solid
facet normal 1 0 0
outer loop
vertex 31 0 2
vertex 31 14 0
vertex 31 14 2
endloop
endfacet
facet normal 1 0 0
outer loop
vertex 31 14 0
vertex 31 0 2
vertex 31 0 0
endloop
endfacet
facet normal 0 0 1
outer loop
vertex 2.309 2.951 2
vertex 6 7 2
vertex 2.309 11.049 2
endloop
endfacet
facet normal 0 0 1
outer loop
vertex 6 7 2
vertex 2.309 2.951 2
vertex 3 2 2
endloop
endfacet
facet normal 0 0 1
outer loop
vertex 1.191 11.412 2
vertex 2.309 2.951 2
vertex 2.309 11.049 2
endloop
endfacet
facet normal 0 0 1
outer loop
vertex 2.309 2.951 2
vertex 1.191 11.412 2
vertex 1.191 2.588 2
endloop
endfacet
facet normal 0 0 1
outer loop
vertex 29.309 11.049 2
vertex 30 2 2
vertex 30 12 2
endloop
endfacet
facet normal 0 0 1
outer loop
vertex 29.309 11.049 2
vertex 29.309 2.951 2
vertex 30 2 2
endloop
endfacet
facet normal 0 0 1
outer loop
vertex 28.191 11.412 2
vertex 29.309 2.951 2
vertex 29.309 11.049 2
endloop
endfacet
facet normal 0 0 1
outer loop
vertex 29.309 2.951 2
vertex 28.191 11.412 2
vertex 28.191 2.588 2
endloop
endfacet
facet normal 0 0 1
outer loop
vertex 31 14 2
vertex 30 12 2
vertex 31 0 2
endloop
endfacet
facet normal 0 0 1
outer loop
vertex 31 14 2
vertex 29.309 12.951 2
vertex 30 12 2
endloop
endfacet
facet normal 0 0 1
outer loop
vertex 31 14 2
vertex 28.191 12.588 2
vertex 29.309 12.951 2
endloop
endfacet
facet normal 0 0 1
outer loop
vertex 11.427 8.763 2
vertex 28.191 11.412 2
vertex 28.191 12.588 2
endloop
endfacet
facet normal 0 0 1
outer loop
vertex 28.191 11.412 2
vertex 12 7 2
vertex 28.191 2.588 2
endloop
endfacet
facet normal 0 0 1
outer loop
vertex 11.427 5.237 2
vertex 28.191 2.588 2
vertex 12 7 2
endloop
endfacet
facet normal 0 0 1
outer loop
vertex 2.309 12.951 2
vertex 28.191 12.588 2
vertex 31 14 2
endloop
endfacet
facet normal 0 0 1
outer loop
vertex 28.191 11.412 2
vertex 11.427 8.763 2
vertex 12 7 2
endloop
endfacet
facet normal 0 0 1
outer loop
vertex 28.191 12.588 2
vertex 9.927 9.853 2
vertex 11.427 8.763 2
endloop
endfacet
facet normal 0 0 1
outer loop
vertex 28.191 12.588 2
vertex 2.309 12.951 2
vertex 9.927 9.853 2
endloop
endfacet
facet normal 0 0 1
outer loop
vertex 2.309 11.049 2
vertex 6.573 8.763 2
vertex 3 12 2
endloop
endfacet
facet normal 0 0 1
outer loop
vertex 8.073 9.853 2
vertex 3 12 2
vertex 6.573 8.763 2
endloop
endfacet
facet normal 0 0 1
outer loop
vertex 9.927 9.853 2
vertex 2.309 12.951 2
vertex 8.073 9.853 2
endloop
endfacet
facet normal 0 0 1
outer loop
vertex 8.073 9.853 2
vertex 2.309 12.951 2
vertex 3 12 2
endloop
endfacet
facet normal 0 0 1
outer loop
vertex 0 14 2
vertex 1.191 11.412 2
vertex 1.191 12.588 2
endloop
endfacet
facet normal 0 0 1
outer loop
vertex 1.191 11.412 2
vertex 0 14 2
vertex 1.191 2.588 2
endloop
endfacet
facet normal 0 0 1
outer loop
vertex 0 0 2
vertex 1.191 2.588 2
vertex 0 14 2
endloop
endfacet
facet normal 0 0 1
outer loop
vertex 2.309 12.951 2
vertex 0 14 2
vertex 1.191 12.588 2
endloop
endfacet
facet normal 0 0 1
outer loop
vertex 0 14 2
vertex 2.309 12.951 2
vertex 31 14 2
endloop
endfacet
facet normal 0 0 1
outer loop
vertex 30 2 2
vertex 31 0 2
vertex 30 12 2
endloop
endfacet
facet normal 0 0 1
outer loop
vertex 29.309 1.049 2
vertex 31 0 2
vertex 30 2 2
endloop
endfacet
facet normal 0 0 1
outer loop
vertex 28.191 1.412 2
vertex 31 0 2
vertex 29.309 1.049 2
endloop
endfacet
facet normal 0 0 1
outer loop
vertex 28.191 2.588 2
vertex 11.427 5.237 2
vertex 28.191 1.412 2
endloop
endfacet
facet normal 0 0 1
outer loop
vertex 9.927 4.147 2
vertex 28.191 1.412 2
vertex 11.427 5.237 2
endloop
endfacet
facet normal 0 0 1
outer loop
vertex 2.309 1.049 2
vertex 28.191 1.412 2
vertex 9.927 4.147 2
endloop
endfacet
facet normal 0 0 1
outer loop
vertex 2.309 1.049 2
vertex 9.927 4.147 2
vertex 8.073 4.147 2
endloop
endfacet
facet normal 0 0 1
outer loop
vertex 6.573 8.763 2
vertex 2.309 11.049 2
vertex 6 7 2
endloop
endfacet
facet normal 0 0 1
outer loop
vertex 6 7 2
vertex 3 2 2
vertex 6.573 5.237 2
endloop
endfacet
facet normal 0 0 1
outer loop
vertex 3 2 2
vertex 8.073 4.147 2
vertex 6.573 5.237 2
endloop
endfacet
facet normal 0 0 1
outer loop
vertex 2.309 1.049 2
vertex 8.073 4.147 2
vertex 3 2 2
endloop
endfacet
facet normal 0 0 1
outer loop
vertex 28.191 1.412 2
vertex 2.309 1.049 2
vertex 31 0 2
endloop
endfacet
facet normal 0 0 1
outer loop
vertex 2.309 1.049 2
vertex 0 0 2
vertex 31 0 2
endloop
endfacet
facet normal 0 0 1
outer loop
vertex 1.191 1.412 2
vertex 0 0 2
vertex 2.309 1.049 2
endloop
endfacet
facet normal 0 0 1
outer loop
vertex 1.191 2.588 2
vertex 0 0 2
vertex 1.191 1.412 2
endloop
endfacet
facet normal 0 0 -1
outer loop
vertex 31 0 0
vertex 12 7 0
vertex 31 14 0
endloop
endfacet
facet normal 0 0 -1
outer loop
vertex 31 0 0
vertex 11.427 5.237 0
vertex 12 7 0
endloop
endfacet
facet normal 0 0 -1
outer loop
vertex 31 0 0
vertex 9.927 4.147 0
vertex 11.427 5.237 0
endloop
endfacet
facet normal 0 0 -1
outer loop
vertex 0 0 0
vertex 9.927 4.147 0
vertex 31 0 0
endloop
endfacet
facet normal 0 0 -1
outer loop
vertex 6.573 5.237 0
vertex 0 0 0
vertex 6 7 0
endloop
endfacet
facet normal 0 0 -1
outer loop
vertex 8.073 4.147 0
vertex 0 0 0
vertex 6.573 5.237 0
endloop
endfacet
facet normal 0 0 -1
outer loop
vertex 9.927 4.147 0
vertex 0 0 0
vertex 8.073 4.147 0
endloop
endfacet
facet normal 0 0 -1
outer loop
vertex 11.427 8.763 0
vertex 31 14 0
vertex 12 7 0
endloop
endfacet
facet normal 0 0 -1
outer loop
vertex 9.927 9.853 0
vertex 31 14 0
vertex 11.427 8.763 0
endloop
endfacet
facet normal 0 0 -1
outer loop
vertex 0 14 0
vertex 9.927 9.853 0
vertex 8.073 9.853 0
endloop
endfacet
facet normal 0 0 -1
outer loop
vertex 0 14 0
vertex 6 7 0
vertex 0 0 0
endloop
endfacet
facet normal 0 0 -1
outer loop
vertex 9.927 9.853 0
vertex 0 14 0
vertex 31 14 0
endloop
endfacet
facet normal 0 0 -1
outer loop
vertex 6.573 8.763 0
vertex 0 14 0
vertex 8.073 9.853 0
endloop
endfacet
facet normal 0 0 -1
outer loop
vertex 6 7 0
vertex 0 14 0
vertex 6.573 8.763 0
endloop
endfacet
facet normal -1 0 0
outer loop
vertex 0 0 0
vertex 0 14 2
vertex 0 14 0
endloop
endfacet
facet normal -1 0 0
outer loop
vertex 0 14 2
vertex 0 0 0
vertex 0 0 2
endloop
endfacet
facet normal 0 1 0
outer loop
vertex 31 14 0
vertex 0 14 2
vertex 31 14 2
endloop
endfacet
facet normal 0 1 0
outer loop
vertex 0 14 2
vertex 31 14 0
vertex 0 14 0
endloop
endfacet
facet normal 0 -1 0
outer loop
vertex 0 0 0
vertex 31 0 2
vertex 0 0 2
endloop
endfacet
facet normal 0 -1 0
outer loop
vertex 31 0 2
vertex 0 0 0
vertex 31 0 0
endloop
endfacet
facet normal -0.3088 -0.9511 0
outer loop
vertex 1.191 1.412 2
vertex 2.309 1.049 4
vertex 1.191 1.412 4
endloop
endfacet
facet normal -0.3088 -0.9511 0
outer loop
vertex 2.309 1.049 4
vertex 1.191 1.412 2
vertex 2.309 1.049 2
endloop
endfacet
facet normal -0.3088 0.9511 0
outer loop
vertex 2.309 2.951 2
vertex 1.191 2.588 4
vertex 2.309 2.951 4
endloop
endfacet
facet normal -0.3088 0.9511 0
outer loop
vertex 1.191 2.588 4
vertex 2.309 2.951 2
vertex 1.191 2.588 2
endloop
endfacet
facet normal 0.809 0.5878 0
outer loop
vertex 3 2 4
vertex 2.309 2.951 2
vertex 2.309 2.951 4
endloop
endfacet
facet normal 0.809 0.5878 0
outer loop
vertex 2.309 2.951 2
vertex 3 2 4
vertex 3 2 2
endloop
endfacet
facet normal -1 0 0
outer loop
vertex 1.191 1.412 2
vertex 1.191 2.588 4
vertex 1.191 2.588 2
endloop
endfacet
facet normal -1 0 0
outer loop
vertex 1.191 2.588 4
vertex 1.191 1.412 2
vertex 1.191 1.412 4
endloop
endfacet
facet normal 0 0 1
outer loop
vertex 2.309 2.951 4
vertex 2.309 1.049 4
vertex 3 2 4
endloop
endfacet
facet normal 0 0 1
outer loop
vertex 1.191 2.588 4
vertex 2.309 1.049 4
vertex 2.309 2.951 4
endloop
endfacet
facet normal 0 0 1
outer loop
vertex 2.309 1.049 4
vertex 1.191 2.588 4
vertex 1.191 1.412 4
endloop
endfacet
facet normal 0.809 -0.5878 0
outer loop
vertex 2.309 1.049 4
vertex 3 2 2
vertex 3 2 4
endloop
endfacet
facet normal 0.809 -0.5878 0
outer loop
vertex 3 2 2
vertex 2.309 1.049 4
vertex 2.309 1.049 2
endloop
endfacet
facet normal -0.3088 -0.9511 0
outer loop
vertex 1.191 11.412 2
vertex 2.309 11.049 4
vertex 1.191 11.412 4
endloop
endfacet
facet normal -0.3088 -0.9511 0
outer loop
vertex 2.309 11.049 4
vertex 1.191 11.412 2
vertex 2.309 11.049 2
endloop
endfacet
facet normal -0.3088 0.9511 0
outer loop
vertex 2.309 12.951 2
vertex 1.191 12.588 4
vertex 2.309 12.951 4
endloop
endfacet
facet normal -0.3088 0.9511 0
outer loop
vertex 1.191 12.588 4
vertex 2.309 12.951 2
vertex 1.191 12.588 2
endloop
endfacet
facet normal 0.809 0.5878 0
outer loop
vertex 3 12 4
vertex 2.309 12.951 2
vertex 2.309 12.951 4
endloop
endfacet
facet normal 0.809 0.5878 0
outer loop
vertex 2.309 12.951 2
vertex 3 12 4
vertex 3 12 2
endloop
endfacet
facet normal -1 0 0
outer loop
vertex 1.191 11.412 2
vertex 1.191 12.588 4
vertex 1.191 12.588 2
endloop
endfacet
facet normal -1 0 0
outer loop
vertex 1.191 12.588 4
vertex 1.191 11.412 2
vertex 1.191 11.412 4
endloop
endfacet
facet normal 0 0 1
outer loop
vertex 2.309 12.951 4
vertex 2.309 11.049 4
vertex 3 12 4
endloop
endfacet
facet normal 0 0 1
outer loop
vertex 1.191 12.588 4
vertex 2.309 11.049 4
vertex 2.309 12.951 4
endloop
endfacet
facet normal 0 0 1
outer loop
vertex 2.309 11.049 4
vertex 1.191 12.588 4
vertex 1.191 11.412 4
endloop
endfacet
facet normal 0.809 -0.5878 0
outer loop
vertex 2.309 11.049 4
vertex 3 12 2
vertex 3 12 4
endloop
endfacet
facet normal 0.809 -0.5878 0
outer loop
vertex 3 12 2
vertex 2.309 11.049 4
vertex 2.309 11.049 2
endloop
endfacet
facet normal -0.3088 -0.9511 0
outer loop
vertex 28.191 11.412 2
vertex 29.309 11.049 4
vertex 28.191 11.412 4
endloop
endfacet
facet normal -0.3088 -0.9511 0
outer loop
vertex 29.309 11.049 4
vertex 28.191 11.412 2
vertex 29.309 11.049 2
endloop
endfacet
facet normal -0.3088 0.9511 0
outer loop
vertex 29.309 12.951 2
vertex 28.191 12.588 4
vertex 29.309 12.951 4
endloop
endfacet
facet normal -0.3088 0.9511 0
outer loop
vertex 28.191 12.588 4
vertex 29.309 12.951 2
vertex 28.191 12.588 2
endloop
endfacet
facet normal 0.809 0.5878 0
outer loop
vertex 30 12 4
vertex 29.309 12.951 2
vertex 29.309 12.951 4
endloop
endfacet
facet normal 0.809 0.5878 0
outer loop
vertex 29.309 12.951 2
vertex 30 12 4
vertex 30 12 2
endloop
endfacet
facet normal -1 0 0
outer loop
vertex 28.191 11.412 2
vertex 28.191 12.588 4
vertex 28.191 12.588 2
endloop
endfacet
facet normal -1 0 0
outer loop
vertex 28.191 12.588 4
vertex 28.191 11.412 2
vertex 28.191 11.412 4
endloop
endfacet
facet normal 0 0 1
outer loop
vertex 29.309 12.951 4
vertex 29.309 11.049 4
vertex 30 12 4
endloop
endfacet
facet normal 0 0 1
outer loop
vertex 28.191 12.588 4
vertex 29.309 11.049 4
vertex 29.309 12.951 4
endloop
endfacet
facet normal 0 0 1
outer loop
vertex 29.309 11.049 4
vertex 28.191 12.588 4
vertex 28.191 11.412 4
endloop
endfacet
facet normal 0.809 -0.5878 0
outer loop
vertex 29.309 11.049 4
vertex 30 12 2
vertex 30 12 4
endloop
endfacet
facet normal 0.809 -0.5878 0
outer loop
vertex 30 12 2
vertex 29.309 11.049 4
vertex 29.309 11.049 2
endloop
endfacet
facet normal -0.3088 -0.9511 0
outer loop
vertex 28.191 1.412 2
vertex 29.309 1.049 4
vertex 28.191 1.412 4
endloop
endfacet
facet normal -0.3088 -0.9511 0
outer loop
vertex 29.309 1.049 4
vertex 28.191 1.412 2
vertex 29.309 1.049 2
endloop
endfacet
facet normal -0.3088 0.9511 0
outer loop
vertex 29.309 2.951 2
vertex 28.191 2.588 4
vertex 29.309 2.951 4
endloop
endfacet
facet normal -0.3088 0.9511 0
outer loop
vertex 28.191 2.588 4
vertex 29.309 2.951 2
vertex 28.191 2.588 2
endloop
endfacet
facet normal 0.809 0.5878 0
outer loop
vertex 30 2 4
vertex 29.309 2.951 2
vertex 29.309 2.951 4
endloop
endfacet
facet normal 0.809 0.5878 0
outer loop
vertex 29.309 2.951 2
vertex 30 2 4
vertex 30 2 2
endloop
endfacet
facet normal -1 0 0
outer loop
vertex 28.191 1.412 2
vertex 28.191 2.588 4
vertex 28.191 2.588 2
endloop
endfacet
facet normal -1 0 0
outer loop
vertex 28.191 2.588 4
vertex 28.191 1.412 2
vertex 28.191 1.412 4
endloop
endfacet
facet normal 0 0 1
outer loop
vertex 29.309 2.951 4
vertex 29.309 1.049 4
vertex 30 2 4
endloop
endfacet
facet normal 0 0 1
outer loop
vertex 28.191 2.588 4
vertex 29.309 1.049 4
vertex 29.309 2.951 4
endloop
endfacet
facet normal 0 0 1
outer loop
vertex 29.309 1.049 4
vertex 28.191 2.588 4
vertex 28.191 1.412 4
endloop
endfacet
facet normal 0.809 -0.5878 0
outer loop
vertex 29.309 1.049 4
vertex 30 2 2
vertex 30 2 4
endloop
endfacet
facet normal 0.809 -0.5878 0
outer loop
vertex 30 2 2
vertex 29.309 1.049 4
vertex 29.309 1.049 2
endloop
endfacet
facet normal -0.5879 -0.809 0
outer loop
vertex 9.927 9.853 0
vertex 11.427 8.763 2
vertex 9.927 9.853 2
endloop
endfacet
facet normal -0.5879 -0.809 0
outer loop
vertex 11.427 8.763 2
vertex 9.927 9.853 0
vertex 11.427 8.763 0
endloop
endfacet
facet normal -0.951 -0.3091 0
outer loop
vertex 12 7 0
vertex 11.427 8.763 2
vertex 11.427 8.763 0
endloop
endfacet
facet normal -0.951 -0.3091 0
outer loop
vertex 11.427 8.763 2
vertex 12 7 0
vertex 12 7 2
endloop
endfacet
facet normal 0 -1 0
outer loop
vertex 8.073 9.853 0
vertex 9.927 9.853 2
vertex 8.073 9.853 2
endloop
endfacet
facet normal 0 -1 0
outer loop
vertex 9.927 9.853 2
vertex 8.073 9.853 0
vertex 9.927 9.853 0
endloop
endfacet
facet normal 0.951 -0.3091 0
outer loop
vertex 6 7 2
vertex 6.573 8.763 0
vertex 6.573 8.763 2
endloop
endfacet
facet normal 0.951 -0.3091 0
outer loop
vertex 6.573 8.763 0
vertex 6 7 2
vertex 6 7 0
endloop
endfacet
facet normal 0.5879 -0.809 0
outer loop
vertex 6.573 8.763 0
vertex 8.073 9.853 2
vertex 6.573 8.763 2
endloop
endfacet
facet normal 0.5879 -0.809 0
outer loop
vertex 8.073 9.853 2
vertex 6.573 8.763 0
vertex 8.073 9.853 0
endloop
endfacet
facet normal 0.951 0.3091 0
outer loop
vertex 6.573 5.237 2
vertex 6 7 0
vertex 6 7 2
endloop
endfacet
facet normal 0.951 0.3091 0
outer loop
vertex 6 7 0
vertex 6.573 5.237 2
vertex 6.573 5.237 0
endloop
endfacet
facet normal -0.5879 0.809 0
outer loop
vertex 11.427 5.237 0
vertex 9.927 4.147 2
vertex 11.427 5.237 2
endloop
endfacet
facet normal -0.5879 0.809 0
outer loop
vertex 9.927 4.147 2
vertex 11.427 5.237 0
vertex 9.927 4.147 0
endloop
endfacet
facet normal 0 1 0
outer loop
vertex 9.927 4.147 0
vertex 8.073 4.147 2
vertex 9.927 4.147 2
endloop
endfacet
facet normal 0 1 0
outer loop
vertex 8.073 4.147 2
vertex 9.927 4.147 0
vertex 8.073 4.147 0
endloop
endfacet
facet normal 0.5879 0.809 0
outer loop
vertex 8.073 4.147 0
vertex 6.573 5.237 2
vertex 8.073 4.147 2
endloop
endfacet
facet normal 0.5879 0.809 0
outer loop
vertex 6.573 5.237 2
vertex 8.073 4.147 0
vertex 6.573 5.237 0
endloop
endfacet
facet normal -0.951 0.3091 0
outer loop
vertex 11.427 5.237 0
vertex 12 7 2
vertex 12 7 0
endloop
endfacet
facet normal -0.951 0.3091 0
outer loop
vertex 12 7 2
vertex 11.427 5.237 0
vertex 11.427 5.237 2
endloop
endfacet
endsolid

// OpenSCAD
module bottom() {
	difference() {
		union() {
			// main box
			cube([31,14,2]);
			// the pins
			translate([2, 2, 3])
				cylinder(h = 2, r1 = 1, r2 = 1, center = true);
			translate([2, 12, 3])
				cylinder(h = 2, r1 = 1, r2 = 1, center = true);
			translate([29, 12, 3])
				cylinder(h = 2, r1 = 1, r2 = 1, center = true);
			translate([29, 2, 3])
				cylinder(h = 2, r1 = 1, r2 = 1, center = true);
		}
		// dump hole
		translate([9, 7, 1])
			cylinder(h = 2, r1 = 3, r2 = 3, center = true);
	}
}
bottom();
